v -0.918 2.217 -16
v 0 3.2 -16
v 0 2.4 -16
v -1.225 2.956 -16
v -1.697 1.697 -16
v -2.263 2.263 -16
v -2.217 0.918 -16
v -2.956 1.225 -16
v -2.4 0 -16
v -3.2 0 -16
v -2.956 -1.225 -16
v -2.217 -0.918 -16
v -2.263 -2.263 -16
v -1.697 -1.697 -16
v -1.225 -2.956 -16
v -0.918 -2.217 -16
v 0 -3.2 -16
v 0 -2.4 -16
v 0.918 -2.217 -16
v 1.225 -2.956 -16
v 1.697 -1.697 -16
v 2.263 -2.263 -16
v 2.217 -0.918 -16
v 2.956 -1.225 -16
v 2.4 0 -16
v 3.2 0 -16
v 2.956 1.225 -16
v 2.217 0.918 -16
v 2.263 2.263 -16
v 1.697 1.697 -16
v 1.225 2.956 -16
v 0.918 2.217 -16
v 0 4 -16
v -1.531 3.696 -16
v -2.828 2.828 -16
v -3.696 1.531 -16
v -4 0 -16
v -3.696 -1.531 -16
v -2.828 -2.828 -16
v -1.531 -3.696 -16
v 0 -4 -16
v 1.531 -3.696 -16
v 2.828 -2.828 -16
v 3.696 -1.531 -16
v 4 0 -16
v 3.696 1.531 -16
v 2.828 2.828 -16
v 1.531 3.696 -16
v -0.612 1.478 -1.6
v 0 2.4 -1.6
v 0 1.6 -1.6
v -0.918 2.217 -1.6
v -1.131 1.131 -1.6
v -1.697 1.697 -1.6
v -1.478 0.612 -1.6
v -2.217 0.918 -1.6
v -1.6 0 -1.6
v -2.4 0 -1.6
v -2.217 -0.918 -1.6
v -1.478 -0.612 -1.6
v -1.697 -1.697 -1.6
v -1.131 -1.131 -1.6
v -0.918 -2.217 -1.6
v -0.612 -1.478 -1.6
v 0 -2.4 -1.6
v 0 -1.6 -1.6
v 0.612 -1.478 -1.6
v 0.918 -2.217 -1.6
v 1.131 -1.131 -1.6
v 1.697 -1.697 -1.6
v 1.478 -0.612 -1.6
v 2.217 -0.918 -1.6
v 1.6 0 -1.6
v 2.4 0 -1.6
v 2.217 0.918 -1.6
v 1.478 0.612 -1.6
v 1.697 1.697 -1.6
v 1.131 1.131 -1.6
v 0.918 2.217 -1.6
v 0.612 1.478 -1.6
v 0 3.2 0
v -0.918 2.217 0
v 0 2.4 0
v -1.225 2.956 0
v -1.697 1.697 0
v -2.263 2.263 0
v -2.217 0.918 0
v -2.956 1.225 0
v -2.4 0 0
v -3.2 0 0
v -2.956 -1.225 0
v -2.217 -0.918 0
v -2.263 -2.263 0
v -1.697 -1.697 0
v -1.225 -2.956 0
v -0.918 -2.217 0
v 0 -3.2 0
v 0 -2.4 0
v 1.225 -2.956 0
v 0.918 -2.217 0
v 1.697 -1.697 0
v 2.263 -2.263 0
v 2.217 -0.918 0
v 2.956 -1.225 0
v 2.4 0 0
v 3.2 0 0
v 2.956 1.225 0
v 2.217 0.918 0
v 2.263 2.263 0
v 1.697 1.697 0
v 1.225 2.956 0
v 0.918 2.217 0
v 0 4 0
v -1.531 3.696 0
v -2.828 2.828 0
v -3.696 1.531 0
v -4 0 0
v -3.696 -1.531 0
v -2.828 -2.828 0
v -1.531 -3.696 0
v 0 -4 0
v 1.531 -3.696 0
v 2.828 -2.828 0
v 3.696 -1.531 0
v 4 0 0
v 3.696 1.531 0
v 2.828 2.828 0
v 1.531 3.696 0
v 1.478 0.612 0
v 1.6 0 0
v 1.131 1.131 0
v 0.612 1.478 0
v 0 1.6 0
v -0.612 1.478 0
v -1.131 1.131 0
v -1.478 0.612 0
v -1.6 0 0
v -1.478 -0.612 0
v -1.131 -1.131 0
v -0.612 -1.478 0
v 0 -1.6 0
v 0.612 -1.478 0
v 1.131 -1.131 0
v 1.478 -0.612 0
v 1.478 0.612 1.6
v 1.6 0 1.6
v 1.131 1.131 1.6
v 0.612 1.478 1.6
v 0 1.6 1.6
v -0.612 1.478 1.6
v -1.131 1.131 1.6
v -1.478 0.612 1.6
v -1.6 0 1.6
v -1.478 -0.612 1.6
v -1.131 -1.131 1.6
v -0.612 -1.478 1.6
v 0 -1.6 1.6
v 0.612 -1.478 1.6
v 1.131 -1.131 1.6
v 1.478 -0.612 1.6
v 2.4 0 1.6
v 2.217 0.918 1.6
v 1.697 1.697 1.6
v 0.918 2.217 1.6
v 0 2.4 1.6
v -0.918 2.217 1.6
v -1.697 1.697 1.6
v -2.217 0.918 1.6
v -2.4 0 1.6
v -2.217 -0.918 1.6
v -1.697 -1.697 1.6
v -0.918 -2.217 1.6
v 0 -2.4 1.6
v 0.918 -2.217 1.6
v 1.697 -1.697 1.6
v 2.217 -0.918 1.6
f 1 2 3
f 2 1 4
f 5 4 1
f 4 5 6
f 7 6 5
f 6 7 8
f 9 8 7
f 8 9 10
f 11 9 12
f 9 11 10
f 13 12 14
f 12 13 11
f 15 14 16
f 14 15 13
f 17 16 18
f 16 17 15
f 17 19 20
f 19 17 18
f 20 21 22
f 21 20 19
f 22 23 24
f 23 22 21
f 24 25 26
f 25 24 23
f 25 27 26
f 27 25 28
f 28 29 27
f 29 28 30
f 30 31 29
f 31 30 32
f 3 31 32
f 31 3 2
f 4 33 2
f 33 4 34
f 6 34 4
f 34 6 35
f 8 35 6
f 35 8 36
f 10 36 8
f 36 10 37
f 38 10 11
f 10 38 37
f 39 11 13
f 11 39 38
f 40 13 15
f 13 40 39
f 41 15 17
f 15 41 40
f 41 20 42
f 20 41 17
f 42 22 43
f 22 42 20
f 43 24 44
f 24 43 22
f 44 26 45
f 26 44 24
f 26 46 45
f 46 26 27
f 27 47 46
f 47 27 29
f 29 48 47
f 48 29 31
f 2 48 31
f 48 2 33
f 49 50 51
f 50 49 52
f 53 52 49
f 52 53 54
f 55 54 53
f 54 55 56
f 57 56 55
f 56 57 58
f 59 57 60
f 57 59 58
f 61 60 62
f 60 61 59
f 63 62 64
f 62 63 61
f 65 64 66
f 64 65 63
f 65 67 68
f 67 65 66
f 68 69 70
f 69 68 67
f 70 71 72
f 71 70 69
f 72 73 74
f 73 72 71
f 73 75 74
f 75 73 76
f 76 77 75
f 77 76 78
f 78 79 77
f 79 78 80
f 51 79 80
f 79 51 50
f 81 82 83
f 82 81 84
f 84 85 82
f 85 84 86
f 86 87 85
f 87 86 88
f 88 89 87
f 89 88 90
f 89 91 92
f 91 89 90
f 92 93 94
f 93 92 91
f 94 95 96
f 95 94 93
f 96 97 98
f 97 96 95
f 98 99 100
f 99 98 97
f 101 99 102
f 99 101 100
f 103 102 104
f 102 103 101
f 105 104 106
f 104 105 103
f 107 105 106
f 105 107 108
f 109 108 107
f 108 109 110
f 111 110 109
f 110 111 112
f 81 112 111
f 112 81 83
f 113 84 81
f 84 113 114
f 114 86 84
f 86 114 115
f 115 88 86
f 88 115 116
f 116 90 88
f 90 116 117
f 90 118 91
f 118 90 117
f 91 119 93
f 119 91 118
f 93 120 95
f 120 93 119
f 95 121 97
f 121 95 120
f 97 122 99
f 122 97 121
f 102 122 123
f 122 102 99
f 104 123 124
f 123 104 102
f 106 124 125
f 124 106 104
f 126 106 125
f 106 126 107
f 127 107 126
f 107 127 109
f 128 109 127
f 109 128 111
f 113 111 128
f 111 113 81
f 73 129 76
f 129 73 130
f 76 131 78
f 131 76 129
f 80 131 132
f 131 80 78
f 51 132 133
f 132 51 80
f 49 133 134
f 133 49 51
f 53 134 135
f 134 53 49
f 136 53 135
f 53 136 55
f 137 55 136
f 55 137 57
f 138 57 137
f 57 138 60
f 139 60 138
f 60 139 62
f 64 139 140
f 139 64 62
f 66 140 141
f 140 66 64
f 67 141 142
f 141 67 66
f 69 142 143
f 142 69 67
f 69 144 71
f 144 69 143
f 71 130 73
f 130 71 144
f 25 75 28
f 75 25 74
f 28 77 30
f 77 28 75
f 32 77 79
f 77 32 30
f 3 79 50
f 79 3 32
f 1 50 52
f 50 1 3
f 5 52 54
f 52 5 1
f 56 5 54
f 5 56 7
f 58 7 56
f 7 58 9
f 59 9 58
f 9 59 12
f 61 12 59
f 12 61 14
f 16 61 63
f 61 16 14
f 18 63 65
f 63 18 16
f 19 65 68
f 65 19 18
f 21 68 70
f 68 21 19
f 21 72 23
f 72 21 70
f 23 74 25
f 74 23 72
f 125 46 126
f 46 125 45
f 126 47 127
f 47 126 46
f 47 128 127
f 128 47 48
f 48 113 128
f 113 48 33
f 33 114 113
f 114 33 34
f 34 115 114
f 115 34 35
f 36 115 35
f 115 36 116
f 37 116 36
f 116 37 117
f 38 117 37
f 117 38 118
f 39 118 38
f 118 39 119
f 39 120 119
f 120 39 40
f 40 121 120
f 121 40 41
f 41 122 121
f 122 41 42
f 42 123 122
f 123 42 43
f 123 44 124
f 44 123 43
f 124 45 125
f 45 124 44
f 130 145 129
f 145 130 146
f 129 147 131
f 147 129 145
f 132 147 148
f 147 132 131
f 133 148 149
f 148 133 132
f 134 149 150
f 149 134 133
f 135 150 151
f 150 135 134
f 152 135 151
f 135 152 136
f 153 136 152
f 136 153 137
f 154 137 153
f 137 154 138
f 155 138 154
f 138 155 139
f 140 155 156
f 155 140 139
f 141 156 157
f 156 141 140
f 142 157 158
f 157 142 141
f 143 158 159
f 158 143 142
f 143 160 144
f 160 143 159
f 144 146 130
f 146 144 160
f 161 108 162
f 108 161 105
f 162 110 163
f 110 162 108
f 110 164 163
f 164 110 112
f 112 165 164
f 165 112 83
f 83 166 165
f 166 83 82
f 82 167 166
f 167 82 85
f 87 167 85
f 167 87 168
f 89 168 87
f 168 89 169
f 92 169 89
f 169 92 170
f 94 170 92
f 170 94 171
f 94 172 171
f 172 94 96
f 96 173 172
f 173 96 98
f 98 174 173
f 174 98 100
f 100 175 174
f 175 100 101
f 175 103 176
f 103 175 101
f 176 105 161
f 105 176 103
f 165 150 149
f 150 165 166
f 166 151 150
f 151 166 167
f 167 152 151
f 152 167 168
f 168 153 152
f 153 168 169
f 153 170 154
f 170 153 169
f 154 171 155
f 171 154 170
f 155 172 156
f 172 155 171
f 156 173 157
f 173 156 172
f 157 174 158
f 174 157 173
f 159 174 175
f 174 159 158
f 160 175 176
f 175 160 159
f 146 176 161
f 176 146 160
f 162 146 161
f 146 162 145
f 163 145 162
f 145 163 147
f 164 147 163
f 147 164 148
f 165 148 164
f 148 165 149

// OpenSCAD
// file: ../p/stud2a.scad
use <../lib.scad>
use <4-4cyli.scad>
use <4-4edge.scad>
use <4-4ring2.scad>
function ldraw_lib__stud2a() = [
// 0 Stud Open without Base Edges
// 0 Name: stud2a.dat
// 0 Author: James Jessiman
// 0 !LDRAW_ORG Primitive UPDATE 2009-02
// 0 !LICENSE Licensed under CC BY 2.0 and CC BY 4.0 : see CAreadme.txt
// 
// 0 BFC CERTIFY CCW
  [0,"BFC","CERTIFY"],
  [0,"BFC","CCW"],
// 
// 0 !HISTORY 1999-07-05 [PTadmin] Official Update 1999-05
// 0 !HISTORY 2002-04-04 [sbliss] Modified for BFC compliance
// 0 !HISTORY 2002-04-25 [PTadmin] Official Update 2002-02
// 0 !HISTORY 2007-06-24 [PTadmin] Header formatted for Contributor Agreement
// 0 !HISTORY 2008-07-01 [PTadmin] Official Update 2008-01
// 0 !HISTORY 2009-06-21 [cwdee] Update ring references to 4-4ring
// 0 !HISTORY 2009-09-03 [PTadmin] Official Update 2009-02
// 
// 
// 1 16 0 -4 0 4 0 0 0 1 0 0 0 4 4-4edge.dat
  [1,16,0,-4,0,4,0,0,0,1,0,0,0,4, ldraw_lib__4_4edge()],
// 1 16 0 -4 0 6 0 0 0 1 0 0 0 6 4-4edge.dat
  [1,16,0,-4,0,6,0,0,0,1,0,0,0,6, ldraw_lib__4_4edge()],
// 0 BFC INVERTNEXT
  [0,"BFC","INVERTNEXT"],
// 1 16 0 -4 0 4 0 0 0 4 0 0 0 4 4-4cyli.dat
  [1,16,0,-4,0,4,0,0,0,4,0,0,0,4, ldraw_lib__4_4cyli()],
// 1 16 0 -4 0 6 0 0 0 4 0 0 0 6 4-4cyli.dat
  [1,16,0,-4,0,6,0,0,0,4,0,0,0,6, ldraw_lib__4_4cyli()],
// 1 16 0 -4 0 2 0 0 0 1 0 0 0 2 4-4ring2.dat
  [1,16,0,-4,0,2,0,0,0,1,0,0,0,2, ldraw_lib__4_4ring2()],
// 0
];
module ldraw_lib__stud2a(step=0, col=false, unit=2/5, alt=false, line=0.2, solid=!$preview)
    makepoly(ldraw_lib__stud2a(), step=step, col=col, unit=unit, alt=alt, line=line, solid=solid);
ldraw_lib__stud2a(line=0.2);
// file: ../p/4-4ring4.scad
use <../lib.scad>
function ldraw_lib__4_4ring4() = [
// 0 Ring  4 x 1.0
// 0 Name: 4-4ring4.dat
// 0 Author: James Jessiman
// 0 !LDRAW_ORG Primitive UPDATE 2009-01
// 0 !LICENSE Licensed under CC BY 2.0 and CC BY 4.0 : see CAreadme.txt
// 
// 0 BFC CERTIFY CCW
  [0,"BFC","CERTIFY"],
  [0,"BFC","CCW"],
// 
// 0 !HISTORY 1998-12-15 [PTadmin] Official Update 1998-10
// 0 !HISTORY 2002-04-08 [BrickCaster] Modified for BFC compliance
// 0 !HISTORY 2002-04-25 [PTadmin] Official Update 2002-02
// 0 !HISTORY 2007-06-24 [PTadmin] Header formatted for Contributor Agreement
// 0 !HISTORY 2008-07-01 [PTadmin] Official Update 2008-01
// 0 !HISTORY 2008-08-26 [cwdee] Switch polygon winding and rename
// 0 !HISTORY 2009-05-02 [PTadmin] Official Update 2009-01
// 
// 
// 4 16 -1.9135 0 4.6195 -1.5308 0 3.6956 0 0 4 0 0 5
  [4,16,-1.9135,0,4.6195,-1.5308,0,3.6956,0,0,4,0,0,5],
// 4 16 -3.5355 0 3.5355 -2.8284 0 2.8284 -1.5308 0 3.6956 -1.9135 0 4.6195
  [4,16,-3.5355,0,3.5355,-2.8284,0,2.8284,-1.5308,0,3.6956,-1.9135,0,4.6195],
// 4 16 -4.6195 0 1.9135 -3.6956 0 1.5308 -2.8284 0 2.8284 -3.5355 0 3.5355
  [4,16,-4.6195,0,1.9135,-3.6956,0,1.5308,-2.8284,0,2.8284,-3.5355,0,3.5355],
// 4 16 -5 0 0 -4 0 0 -3.6956 0 1.5308 -4.6195 0 1.9135
  [4,16,-5,0,0,-4,0,0,-3.6956,0,1.5308,-4.6195,0,1.9135],
// 4 16 -4.6195 0 -1.9135 -3.6956 0 -1.5308 -4 0 0 -5 0 0
  [4,16,-4.6195,0,-1.9135,-3.6956,0,-1.5308,-4,0,0,-5,0,0],
// 4 16 -3.5355 0 -3.5355 -2.8284 0 -2.8284 -3.6956 0 -1.5308 -4.6195 0 -1.9135
  [4,16,-3.5355,0,-3.5355,-2.8284,0,-2.8284,-3.6956,0,-1.5308,-4.6195,0,-1.9135],
// 4 16 -1.9135 0 -4.6195 -1.5308 0 -3.6956 -2.8284 0 -2.8284 -3.5355 0 -3.5355
  [4,16,-1.9135,0,-4.6195,-1.5308,0,-3.6956,-2.8284,0,-2.8284,-3.5355,0,-3.5355],
// 4 16 0 0 -5 0 0 -4 -1.5308 0 -3.6956 -1.9135 0 -4.6195
  [4,16,0,0,-5,0,0,-4,-1.5308,0,-3.6956,-1.9135,0,-4.6195],
// 4 16 1.9135 0 -4.6195 1.5308 0 -3.6956 0 0 -4 0 0 -5
  [4,16,1.9135,0,-4.6195,1.5308,0,-3.6956,0,0,-4,0,0,-5],
// 4 16 3.5355 0 -3.5355 2.8284 0 -2.8284 1.5308 0 -3.6956 1.9135 0 -4.6195
  [4,16,3.5355,0,-3.5355,2.8284,0,-2.8284,1.5308,0,-3.6956,1.9135,0,-4.6195],
// 4 16 4.6195 0 -1.9135 3.6956 0 -1.5308 2.8284 0 -2.8284 3.5355 0 -3.5355
  [4,16,4.6195,0,-1.9135,3.6956,0,-1.5308,2.8284,0,-2.8284,3.5355,0,-3.5355],
// 4 16 5 0 0 4 0 0 3.6956 0 -1.5308 4.6195 0 -1.9135
  [4,16,5,0,0,4,0,0,3.6956,0,-1.5308,4.6195,0,-1.9135],
// 4 16 4.6195 0 1.9135 3.6956 0 1.5308 4 0 0 5 0 0
  [4,16,4.6195,0,1.9135,3.6956,0,1.5308,4,0,0,5,0,0],
// 4 16 3.5355 0 3.5355 2.8284 0 2.8284 3.6956 0 1.5308 4.6195 0 1.9135
  [4,16,3.5355,0,3.5355,2.8284,0,2.8284,3.6956,0,1.5308,4.6195,0,1.9135],
// 4 16 1.9135 0 4.6195 1.5308 0 3.6956 2.8284 0 2.8284 3.5355 0 3.5355
  [4,16,1.9135,0,4.6195,1.5308,0,3.6956,2.8284,0,2.8284,3.5355,0,3.5355],
// 4 16 0 0 5 0 0 4 1.5308 0 3.6956 1.9135 0 4.6195
  [4,16,0,0,5,0,0,4,1.5308,0,3.6956,1.9135,0,4.6195],
// 0
];
module ldraw_lib__4_4ring4(step=0, col=false, unit=2/5, alt=false, line=0.2, solid=!$preview)
    makepoly(ldraw_lib__4_4ring4(), step=step, col=col, unit=unit, alt=alt, line=line, solid=solid);
ldraw_lib__4_4ring4(line=0.2);
// file: ../p/4-4ring3.scad
use <../lib.scad>
function ldraw_lib__4_4ring3() = [
// 0 Ring  3 x 1.0
// 0 Name: 4-4ring3.dat
// 0 Author: James Jessiman
// 0 !LDRAW_ORG Primitive UPDATE 2009-01
// 0 !LICENSE Licensed under CC BY 2.0 and CC BY 4.0 : see CAreadme.txt
// 
// 0 BFC CERTIFY CCW
  [0,"BFC","CERTIFY"],
  [0,"BFC","CCW"],
// 
// 0 !HISTORY 1998-12-15 [PTadmin] Official Update 1998-10
// 0 !HISTORY 2002-04-05 [hafhead] Added BFC statement
// 0 !HISTORY 2002-04-25 [PTadmin] Official Update 2002-02
// 0 !HISTORY 2007-06-24 [PTadmin] Header formatted for Contributor Agreement
// 0 !HISTORY 2008-07-01 [PTadmin] Official Update 2008-01
// 0 !HISTORY 2008-08-26 [cwdee] Switch polygon winding and rename
// 0 !HISTORY 2009-05-02 [PTadmin] Official Update 2009-01
// 
// 
// 4 16 -1.5308 0 3.6956 -1.1481 0 2.7717 0 0 3 0 0 4
  [4,16,-1.5308,0,3.6956,-1.1481,0,2.7717,0,0,3,0,0,4],
// 4 16 -2.8284 0 2.8284 -2.1213 0 2.1213 -1.1481 0 2.7717 -1.5308 0 3.6956
  [4,16,-2.8284,0,2.8284,-2.1213,0,2.1213,-1.1481,0,2.7717,-1.5308,0,3.6956],
// 4 16 -3.6956 0 1.5308 -2.7717 0 1.1481 -2.1213 0 2.1213 -2.8284 0 2.8284
  [4,16,-3.6956,0,1.5308,-2.7717,0,1.1481,-2.1213,0,2.1213,-2.8284,0,2.8284],
// 4 16 -4 0 0 -3 0 0 -2.7717 0 1.1481 -3.6956 0 1.5308
  [4,16,-4,0,0,-3,0,0,-2.7717,0,1.1481,-3.6956,0,1.5308],
// 4 16 -3.6956 0 -1.5308 -2.7717 0 -1.1481 -3 0 0 -4 0 0
  [4,16,-3.6956,0,-1.5308,-2.7717,0,-1.1481,-3,0,0,-4,0,0],
// 4 16 -2.8284 0 -2.8284 -2.1213 0 -2.1213 -2.7717 0 -1.1481 -3.6956 0 -1.5308
  [4,16,-2.8284,0,-2.8284,-2.1213,0,-2.1213,-2.7717,0,-1.1481,-3.6956,0,-1.5308],
// 4 16 -1.5308 0 -3.6956 -1.1481 0 -2.7717 -2.1213 0 -2.1213 -2.8284 0 -2.8284
  [4,16,-1.5308,0,-3.6956,-1.1481,0,-2.7717,-2.1213,0,-2.1213,-2.8284,0,-2.8284],
// 4 16 0 0 -4 0 0 -3 -1.1481 0 -2.7717 -1.5308 0 -3.6956
  [4,16,0,0,-4,0,0,-3,-1.1481,0,-2.7717,-1.5308,0,-3.6956],
// 4 16 1.5308 0 -3.6956 1.1481 0 -2.7717 0 0 -3 0 0 -4
  [4,16,1.5308,0,-3.6956,1.1481,0,-2.7717,0,0,-3,0,0,-4],
// 4 16 2.8284 0 -2.8284 2.1213 0 -2.1213 1.1481 0 -2.7717 1.5308 0 -3.6956
  [4,16,2.8284,0,-2.8284,2.1213,0,-2.1213,1.1481,0,-2.7717,1.5308,0,-3.6956],
// 4 16 3.6956 0 -1.5308 2.7717 0 -1.1481 2.1213 0 -2.1213 2.8284 0 -2.8284
  [4,16,3.6956,0,-1.5308,2.7717,0,-1.1481,2.1213,0,-2.1213,2.8284,0,-2.8284],
// 4 16 4 0 0 3 0 0 2.7717 0 -1.1481 3.6956 0 -1.5308
  [4,16,4,0,0,3,0,0,2.7717,0,-1.1481,3.6956,0,-1.5308],
// 4 16 3.6956 0 1.5308 2.7717 0 1.1481 3 0 0 4 0 0
  [4,16,3.6956,0,1.5308,2.7717,0,1.1481,3,0,0,4,0,0],
// 4 16 2.8284 0 2.8284 2.1213 0 2.1213 2.7717 0 1.1481 3.6956 0 1.5308
  [4,16,2.8284,0,2.8284,2.1213,0,2.1213,2.7717,0,1.1481,3.6956,0,1.5308],
// 4 16 1.5308 0 3.6956 1.1481 0 2.7717 2.1213 0 2.1213 2.8284 0 2.8284
  [4,16,1.5308,0,3.6956,1.1481,0,2.7717,2.1213,0,2.1213,2.8284,0,2.8284],
// 4 16 0 0 4 0 0 3 1.1481 0 2.7717 1.5308 0 3.6956
  [4,16,0,0,4,0,0,3,1.1481,0,2.7717,1.5308,0,3.6956],
// 0
];
module ldraw_lib__4_4ring3(step=0, col=false, unit=2/5, alt=false, line=0.2, solid=!$preview)
    makepoly(ldraw_lib__4_4ring3(), step=step, col=col, unit=unit, alt=alt, line=line, solid=solid);
ldraw_lib__4_4ring3(line=0.2);
// file: ../p/4-4ring2.scad
use <../lib.scad>
function ldraw_lib__4_4ring2() = [
// 0 Ring  2 x 1.0
// 0 Name: 4-4ring2.dat
// 0 Author: James Jessiman
// 0 !LDRAW_ORG Primitive UPDATE 2009-01
// 0 !LICENSE Licensed under CC BY 2.0 and CC BY 4.0 : see CAreadme.txt
// 
// 0 BFC CERTIFY CCW
  [0,"BFC","CERTIFY"],
  [0,"BFC","CCW"],
// 
// 0 !HISTORY 1998-12-15 [PTadmin] Official Update 1998-10
// 0 !HISTORY 2002-04-05 [hafhead] Added BFC statement
// 0 !HISTORY 2002-04-25 [PTadmin] Official Update 2002-02
// 0 !HISTORY 2007-06-24 [PTadmin] Header formatted for Contributor Agreement
// 0 !HISTORY 2008-07-01 [PTadmin] Official Update 2008-01
// 0 !HISTORY 2008-08-26 [cwdee] Switch polygon winding and rename
// 0 !HISTORY 2009-05-02 [PTadmin] Official Update 2009-01
// 
// 
// 4 16 -1.1481 0 2.7717 -0.7654 0 1.8478 0 0 2 0 0 3
  [4,16,-1.1481,0,2.7717,-0.7654,0,1.8478,0,0,2,0,0,3],
// 4 16 -2.1213 0 2.1213 -1.4142 0 1.4142 -0.7654 0 1.8478 -1.1481 0 2.7717
  [4,16,-2.1213,0,2.1213,-1.4142,0,1.4142,-0.7654,0,1.8478,-1.1481,0,2.7717],
// 4 16 -2.7717 0 1.1481 -1.8478 0 0.7654 -1.4142 0 1.4142 -2.1213 0 2.1213
  [4,16,-2.7717,0,1.1481,-1.8478,0,0.7654,-1.4142,0,1.4142,-2.1213,0,2.1213],
// 4 16 -3 0 0 -2 0 0 -1.8478 0 0.7654 -2.7717 0 1.1481
  [4,16,-3,0,0,-2,0,0,-1.8478,0,0.7654,-2.7717,0,1.1481],
// 4 16 -2.7717 0 -1.1481 -1.8478 0 -0.7654 -2 0 0 -3 0 0
  [4,16,-2.7717,0,-1.1481,-1.8478,0,-0.7654,-2,0,0,-3,0,0],
// 4 16 -2.1213 0 -2.1213 -1.4142 0 -1.4142 -1.8478 0 -0.7654 -2.7717 0 -1.1481
  [4,16,-2.1213,0,-2.1213,-1.4142,0,-1.4142,-1.8478,0,-0.7654,-2.7717,0,-1.1481],
// 4 16 -1.1481 0 -2.7717 -0.7654 0 -1.8478 -1.4142 0 -1.4142 -2.1213 0 -2.1213
  [4,16,-1.1481,0,-2.7717,-0.7654,0,-1.8478,-1.4142,0,-1.4142,-2.1213,0,-2.1213],
// 4 16 0 0 -3 0 0 -2 -0.7654 0 -1.8478 -1.1481 0 -2.7717
  [4,16,0,0,-3,0,0,-2,-0.7654,0,-1.8478,-1.1481,0,-2.7717],
// 4 16 1.1481 0 -2.7717 0.7654 0 -1.8478 0 0 -2 0 0 -3
  [4,16,1.1481,0,-2.7717,0.7654,0,-1.8478,0,0,-2,0,0,-3],
// 4 16 2.1213 0 -2.1213 1.4142 0 -1.4142 0.7654 0 -1.8478 1.1481 0 -2.7717
  [4,16,2.1213,0,-2.1213,1.4142,0,-1.4142,0.7654,0,-1.8478,1.1481,0,-2.7717],
// 4 16 2.7717 0 -1.1481 1.8478 0 -0.7654 1.4142 0 -1.4142 2.1213 0 -2.1213
  [4,16,2.7717,0,-1.1481,1.8478,0,-0.7654,1.4142,0,-1.4142,2.1213,0,-2.1213],
// 4 16 3 0 0 2 0 0 1.8478 0 -0.7654 2.7717 0 -1.1481
  [4,16,3,0,0,2,0,0,1.8478,0,-0.7654,2.7717,0,-1.1481],
// 4 16 2.7717 0 1.1481 1.8478 0 0.7654 2 0 0 3 0 0
  [4,16,2.7717,0,1.1481,1.8478,0,0.7654,2,0,0,3,0,0],
// 4 16 2.1213 0 2.1213 1.4142 0 1.4142 1.8478 0 0.7654 2.7717 0 1.1481
  [4,16,2.1213,0,2.1213,1.4142,0,1.4142,1.8478,0,0.7654,2.7717,0,1.1481],
// 4 16 1.1481 0 2.7717 0.7654 0 1.8478 1.4142 0 1.4142 2.1213 0 2.1213
  [4,16,1.1481,0,2.7717,0.7654,0,1.8478,1.4142,0,1.4142,2.1213,0,2.1213],
// 4 16 0 0 3 0 0 2 0.7654 0 1.8478 1.1481 0 2.7717
  [4,16,0,0,3,0,0,2,0.7654,0,1.8478,1.1481,0,2.7717],
// 0
];
module ldraw_lib__4_4ring2(step=0, col=false, unit=2/5, alt=false, line=0.2, solid=!$preview)
    makepoly(ldraw_lib__4_4ring2(), step=step, col=col, unit=unit, alt=alt, line=line, solid=solid);
ldraw_lib__4_4ring2(line=0.2);
// file: ../p/4-4edge.scad
use <../lib.scad>
function ldraw_lib__4_4edge() = [
// 0 Circle 1.0
// 0 Name: 4-4edge.dat
// 0 Author: James Jessiman
// 0 !LDRAW_ORG Primitive UPDATE 2017-01
// 0 !LICENSE Licensed under CC BY 2.0 and CC BY 4.0 : see CAreadme.txt
// 
// 0 BFC CERTIFY CCW
  [0,"BFC","CERTIFY"],
  [0,"BFC","CCW"],
// 
// 0 !HISTORY 1998-12-15 [PTadmin] Official Update 1998-10
// 0 !HISTORY 2005-12-28 [PTadmin] Official Update 2005-01
// 0 !HISTORY 2007-06-24 [PTadmin] Header formatted for Contributor Agreement
// 0 !HISTORY 2008-07-01 [PTadmin] Official Update 2008-01
// 0 !HISTORY 2017-01-15 [Steffen] BFCed
// 0 !HISTORY 2017-12-30 [PTadmin] Official Update 2017-01
// 
// 
// 2 24 1 0 0 0.9239 0 0.3827
  [2,24,1,0,0,0.9239,0,0.3827],
// 2 24 0.9239 0 0.3827 0.7071 0 0.7071
  [2,24,0.9239,0,0.3827,0.7071,0,0.7071],
// 2 24 0.7071 0 0.7071 0.3827 0 0.9239
  [2,24,0.7071,0,0.7071,0.3827,0,0.9239],
// 2 24 0.3827 0 0.9239 0 0 1
  [2,24,0.3827,0,0.9239,0,0,1],
// 2 24 0 0 1 -0.3827 0 0.9239
  [2,24,0,0,1,-0.3827,0,0.9239],
// 2 24 -0.3827 0 0.9239 -0.7071 0 0.7071
  [2,24,-0.3827,0,0.9239,-0.7071,0,0.7071],
// 2 24 -0.7071 0 0.7071 -0.9239 0 0.3827
  [2,24,-0.7071,0,0.7071,-0.9239,0,0.3827],
// 2 24 -0.9239 0 0.3827 -1 0 -0
  [2,24,-0.9239,0,0.3827,-1,0,-0],
// 2 24 -1 0 -0 -0.9239 0 -0.3827
  [2,24,-1,0,-0,-0.9239,0,-0.3827],
// 2 24 -0.9239 0 -0.3827 -0.7071 0 -0.7071
  [2,24,-0.9239,0,-0.3827,-0.7071,0,-0.7071],
// 2 24 -0.7071 0 -0.7071 -0.3827 0 -0.9239
  [2,24,-0.7071,0,-0.7071,-0.3827,0,-0.9239],
// 2 24 -0.3827 0 -0.9239 0 0 -1
  [2,24,-0.3827,0,-0.9239,0,0,-1],
// 2 24 0 0 -1 0.3827 0 -0.9239
  [2,24,0,0,-1,0.3827,0,-0.9239],
// 2 24 0.3827 0 -0.9239 0.7071 0 -0.7071
  [2,24,0.3827,0,-0.9239,0.7071,0,-0.7071],
// 2 24 0.7071 0 -0.7071 0.9239 0 -0.3827
  [2,24,0.7071,0,-0.7071,0.9239,0,-0.3827],
// 2 24 0.9239 0 -0.3827 1 0 0
  [2,24,0.9239,0,-0.3827,1,0,0],
];
module ldraw_lib__4_4edge(step=0, col=false, unit=2/5, alt=false, line=0.2, solid=!$preview)
    makepoly(ldraw_lib__4_4edge(), step=step, col=col, unit=unit, alt=alt, line=line, solid=solid);
ldraw_lib__4_4edge(line=0.2);
// file: ../p/4-4cyli.scad
use <../lib.scad>
function ldraw_lib__4_4cyli() = [
// 0 Cylinder 1.0
// 0 Name: 4-4cyli.dat
// 0 Author: James Jessiman
// 0 !LDRAW_ORG Primitive UPDATE 2005-01
// 0 !LICENSE Licensed under CC BY 2.0 and CC BY 4.0 : see CAreadme.txt
// 
// 0 BFC CERTIFY CCW
  [0,"BFC","CERTIFY"],
  [0,"BFC","CCW"],
// 
// 0 !HISTORY 1998-12-15 [PTadmin] Official Update 1998-10
// 0 !HISTORY 2002-03-23 [sbliss] Added BFC statement; merged headers from files in distributions LDraw 0.27 and Complete.
// 0 !HISTORY 2002-04-25 [PTadmin] Official Update 2002-02
// 0 !HISTORY 2004-12-14 [guyvivan] BFC CCW
// 0 !HISTORY 2005-12-28 [PTadmin] Official Update 2005-01
// 0 !HISTORY 2007-06-24 [PTadmin] Header formatted for Contributor Agreement
// 0 !HISTORY 2008-07-01 [PTadmin] Official Update 2008-01
// 
// 
// 4 16 1 1 0 0.9239 1 0.3827 0.9239 0 0.3827 1 0 0
  [4,16,1,1,0,0.9239,1,0.3827,0.9239,0,0.3827,1,0,0],
// 5 24 1 0 0 1 1 0 0.9239 0 0.3827 0.9239 0 -0.3827
  [5,24,1,0,0,1,1,0,0.9239,0,0.3827,0.9239,0,-0.3827],
// 4 16 0.9239 1 0.3827 0.7071 1 0.7071 0.7071 0 0.7071 0.9239 0 0.3827
  [4,16,0.9239,1,0.3827,0.7071,1,0.7071,0.7071,0,0.7071,0.9239,0,0.3827],
// 5 24 0.9239 0 0.3827 0.9239 1 0.3827 0.7071 0 0.7071 1 0 0
  [5,24,0.9239,0,0.3827,0.9239,1,0.3827,0.7071,0,0.7071,1,0,0],
// 4 16 0.7071 1 0.7071 0.3827 1 0.9239 0.3827 0 0.9239 0.7071 0 0.7071
  [4,16,0.7071,1,0.7071,0.3827,1,0.9239,0.3827,0,0.9239,0.7071,0,0.7071],
// 5 24 0.7071 0 0.7071 0.7071 1 0.7071 0.3827 0 0.9239 0.9239 0 0.3827
  [5,24,0.7071,0,0.7071,0.7071,1,0.7071,0.3827,0,0.9239,0.9239,0,0.3827],
// 4 16 0.3827 1 0.9239 0 1 1 0 0 1 0.3827 0 0.9239
  [4,16,0.3827,1,0.9239,0,1,1,0,0,1,0.3827,0,0.9239],
// 5 24 0.3827 0 0.9239 0.3827 1 0.9239 0 0 1 0.7071 0 0.7071
  [5,24,0.3827,0,0.9239,0.3827,1,0.9239,0,0,1,0.7071,0,0.7071],
// 4 16 0 1 1 -0.3827 1 0.9239 -0.3827 0 0.9239 0 0 1
  [4,16,0,1,1,-0.3827,1,0.9239,-0.3827,0,0.9239,0,0,1],
// 5 24 0 0 1 0 1 1 -0.3827 0 0.9239 0.3827 0 0.9239
  [5,24,0,0,1,0,1,1,-0.3827,0,0.9239,0.3827,0,0.9239],
// 4 16 -0.3827 1 0.9239 -0.7071 1 0.7071 -0.7071 0 0.7071 -0.3827 0 0.9239
  [4,16,-0.3827,1,0.9239,-0.7071,1,0.7071,-0.7071,0,0.7071,-0.3827,0,0.9239],
// 5 24 -0.3827 0 0.9239 -0.3827 1 0.9239 -0.7071 0 0.7071 0 0 1
  [5,24,-0.3827,0,0.9239,-0.3827,1,0.9239,-0.7071,0,0.7071,0,0,1],
// 4 16 -0.7071 1 0.7071 -0.9239 1 0.3827 -0.9239 0 0.3827 -0.7071 0 0.7071
  [4,16,-0.7071,1,0.7071,-0.9239,1,0.3827,-0.9239,0,0.3827,-0.7071,0,0.7071],
// 5 24 -0.7071 0 0.7071 -0.7071 1 0.7071 -0.9239 0 0.3827 -0.3827 0 0.9239
  [5,24,-0.7071,0,0.7071,-0.7071,1,0.7071,-0.9239,0,0.3827,-0.3827,0,0.9239],
// 4 16 -0.9239 1 0.3827 -1 1 0 -1 0 0 -0.9239 0 0.3827
  [4,16,-0.9239,1,0.3827,-1,1,0,-1,0,0,-0.9239,0,0.3827],
// 5 24 -0.9239 0 0.3827 -0.9239 1 0.3827 -1 0 0 -0.7071 0 0.7071
  [5,24,-0.9239,0,0.3827,-0.9239,1,0.3827,-1,0,0,-0.7071,0,0.7071],
// 4 16 -1 1 0 -0.9239 1 -0.3827 -0.9239 0 -0.3827 -1 0 0
  [4,16,-1,1,0,-0.9239,1,-0.3827,-0.9239,0,-0.3827,-1,0,0],
// 5 24 -1 0 0 -1 1 0 -0.9239 0 -0.3827 -0.9239 0 0.3827
  [5,24,-1,0,0,-1,1,0,-0.9239,0,-0.3827,-0.9239,0,0.3827],
// 4 16 -0.9239 1 -0.3827 -0.7071 1 -0.7071 -0.7071 0 -0.7071 -0.9239 0 -0.3827
  [4,16,-0.9239,1,-0.3827,-0.7071,1,-0.7071,-0.7071,0,-0.7071,-0.9239,0,-0.3827],
// 5 24 -0.9239 0 -0.3827 -0.9239 1 -0.3827 -0.7071 0 -0.7071 -1 0 0
  [5,24,-0.9239,0,-0.3827,-0.9239,1,-0.3827,-0.7071,0,-0.7071,-1,0,0],
// 4 16 -0.7071 1 -0.7071 -0.3827 1 -0.9239 -0.3827 0 -0.9239 -0.7071 0 -0.7071
  [4,16,-0.7071,1,-0.7071,-0.3827,1,-0.9239,-0.3827,0,-0.9239,-0.7071,0,-0.7071],
// 5 24 -0.7071 0 -0.7071 -0.7071 1 -0.7071 -0.3827 0 -0.9239 -0.9239 0 -0.3827
  [5,24,-0.7071,0,-0.7071,-0.7071,1,-0.7071,-0.3827,0,-0.9239,-0.9239,0,-0.3827],
// 4 16 -0.3827 1 -0.9239 0 1 -1 0 0 -1 -0.3827 0 -0.9239
  [4,16,-0.3827,1,-0.9239,0,1,-1,0,0,-1,-0.3827,0,-0.9239],
// 5 24 -0.3827 0 -0.9239 -0.3827 1 -0.9239 0 0 -1 -0.7071 0 -0.7071
  [5,24,-0.3827,0,-0.9239,-0.3827,1,-0.9239,0,0,-1,-0.7071,0,-0.7071],
// 4 16 0 1 -1 0.3827 1 -0.9239 0.3827 0 -0.9239 0 0 -1
  [4,16,0,1,-1,0.3827,1,-0.9239,0.3827,0,-0.9239,0,0,-1],
// 5 24 0 0 -1 0 1 -1 0.3827 0 -0.9239 -0.3827 0 -0.9239
  [5,24,0,0,-1,0,1,-1,0.3827,0,-0.9239,-0.3827,0,-0.9239],
// 4 16 0.3827 1 -0.9239 0.7071 1 -0.7071 0.7071 0 -0.7071 0.3827 0 -0.9239
  [4,16,0.3827,1,-0.9239,0.7071,1,-0.7071,0.7071,0,-0.7071,0.3827,0,-0.9239],
// 5 24 0.3827 0 -0.9239 0.3827 1 -0.9239 0.7071 0 -0.7071 0 0 -1
  [5,24,0.3827,0,-0.9239,0.3827,1,-0.9239,0.7071,0,-0.7071,0,0,-1],
// 4 16 0.7071 1 -0.7071 0.9239 1 -0.3827 0.9239 0 -0.3827 0.7071 0 -0.7071
  [4,16,0.7071,1,-0.7071,0.9239,1,-0.3827,0.9239,0,-0.3827,0.7071,0,-0.7071],
// 5 24 0.7071 0 -0.7071 0.7071 1 -0.7071 0.9239 0 -0.3827 0.3827 0 -0.9239
  [5,24,0.7071,0,-0.7071,0.7071,1,-0.7071,0.9239,0,-0.3827,0.3827,0,-0.9239],
// 4 16 0.9239 1 -0.3827 1 1 0 1 0 0 0.9239 0 -0.3827
  [4,16,0.9239,1,-0.3827,1,1,0,1,0,0,0.9239,0,-0.3827],
// 5 24 0.9239 0 -0.3827 0.9239 1 -0.3827 1 0 0 0.7071 0 -0.7071
  [5,24,0.9239,0,-0.3827,0.9239,1,-0.3827,1,0,0,0.7071,0,-0.7071],
// 0
];
module ldraw_lib__4_4cyli(step=0, col=false, unit=2/5, alt=false, line=0.2, solid=!$preview)
    makepoly(ldraw_lib__4_4cyli(), step=step, col=col, unit=unit, alt=alt, line=line, solid=solid);
ldraw_lib__4_4cyli(line=0.2);
// file: 71075a.scad
use <../lib.scad>
use <../p/4-4cyli.scad>
use <../p/4-4edge.scad>
use <../p/4-4ring2.scad>
use <../p/4-4ring3.scad>
use <../p/4-4ring4.scad>
use <../p/stud2a.scad>
function ldraw_lib__71075a() = [
// 0 Brick  1 x  1 x  1.667 Round
// 0 Name: 71075a.dat
// 0 Author: James Jessiman
// 0 !LDRAW_ORG Part UPDATE 2010-01
// 0 !LICENSE Licensed under CC BY 2.0 and CC BY 4.0 : see CAreadme.txt
// 
// 0 BFC CERTIFY CCW
  [0,"BFC","CERTIFY"],
  [0,"BFC","CCW"],
// 
// 0 !HISTORY 1998-06-20 [PTadmin] Official Update 1998-06
// 0 !HISTORY 2007-10-12 [PTadmin] Header formatted for Contributor Agreement
// 0 !HISTORY 2008-07-01 [PTadmin] Official Update 2008-01
// 0 !HISTORY 2008-07-07 [jriley] Made BFC compliant
// 0 !HISTORY 2008-07-07 [guyvivan] Fixed header and author
// 0 !HISTORY 2009-05-21 [PTadmin] Renamed from 71076. Part number really is 71075, but was mistakenly issued as 71076
// 0 !HISTORY 2010-04-05 [PTadmin] Official Update 2010-01
// 
// 
// 1 16 0 40 0 6 0 0 0 1 0 0 0 6 4-4edge.dat
  [1,16,0,40,0,6,0,0,0,1,0,0,0,6, ldraw_lib__4_4edge()],
// 1 16 0 40 0 10 0 0 0 1 0 0 0 10 4-4edge.dat
  [1,16,0,40,0,10,0,0,0,1,0,0,0,10, ldraw_lib__4_4edge()],
// 1 16 0 4 0 4 0 0 0 1 0 0 0 4 4-4edge.dat
  [1,16,0,4,0,4,0,0,0,1,0,0,0,4, ldraw_lib__4_4edge()],
// 1 16 0 4 0 6 0 0 0 1 0 0 0 6 4-4edge.dat
  [1,16,0,4,0,6,0,0,0,1,0,0,0,6, ldraw_lib__4_4edge()],
// 1 16 0 0 0 6 0 0 0 1 0 0 0 6 4-4edge.dat
  [1,16,0,0,0,6,0,0,0,1,0,0,0,6, ldraw_lib__4_4edge()],
// 1 16 0 0 0 10 0 0 0 1 0 0 0 10 4-4edge.dat
  [1,16,0,0,0,10,0,0,0,1,0,0,0,10, ldraw_lib__4_4edge()],
// 1 16 0 40 0 2 0 0 0 -1 0 0 0 2 4-4ring3.dat
  [1,16,0,40,0,2,0,0,0,-1,0,0,0,2, ldraw_lib__4_4ring3()],
// 1 16 0 40 0 2 0 0 0 -1 0 0 0 2 4-4ring4.dat
  [1,16,0,40,0,2,0,0,0,-1,0,0,0,2, ldraw_lib__4_4ring4()],
// 1 16 0 4 0 2 0 0 0 -1 0 0 0 2 4-4ring2.dat
  [1,16,0,4,0,2,0,0,0,-1,0,0,0,2, ldraw_lib__4_4ring2()],
// 1 16 0 0 0 2 0 0 0 1 0 0 0 2 4-4ring3.dat
  [1,16,0,0,0,2,0,0,0,1,0,0,0,2, ldraw_lib__4_4ring3()],
// 1 16 0 0 0 2 0 0 0 1 0 0 0 2 4-4ring4.dat
  [1,16,0,0,0,2,0,0,0,1,0,0,0,2, ldraw_lib__4_4ring4()],
// 0 BFC INVERTNEXT
  [0,"BFC","INVERTNEXT"],
// 1 16 0 0 0 4 0 0 0 4 0 0 0 4 4-4cyli.dat
  [1,16,0,0,0,4,0,0,0,4,0,0,0,4, ldraw_lib__4_4cyli()],
// 0 BFC INVERTNEXT
  [0,"BFC","INVERTNEXT"],
// 1 16 0 4 0 6 0 0 0 36 0 0 0 6 4-4cyli.dat
  [1,16,0,4,0,6,0,0,0,36,0,0,0,6, ldraw_lib__4_4cyli()],
// 1 16 0 0 0 10 0 0 0 40 0 0 0 10 4-4cyli.dat
  [1,16,0,0,0,10,0,0,0,40,0,0,0,10, ldraw_lib__4_4cyli()],
// 1 16 0 0 0 1 0 0 0 1 0 0 0 1 stud2a.dat
  [1,16,0,0,0,1,0,0,0,1,0,0,0,1, ldraw_lib__stud2a()],
// 0
];
module ldraw_lib__71075a(step=0, col=false, unit=2/5, alt=false, line=0.2, solid=!$preview)
    makepoly(ldraw_lib__71075a(), step=step, col=col, unit=unit, alt=alt, line=line, solid=solid);
ldraw_lib__71075a(line=0.2);
// main file
use <../lib.scad>
use <71075a.scad>
function ldraw_lib__71076() = [
// 0 ~Moved to 71075a
// 0 Name: 71076.dat
// 0 Author: [PTadmin]
// 0 !LDRAW_ORG Part UPDATE 2010-03
// 0 !LICENSE Licensed under CC BY 4.0 : see CAreadme.txt
// 
// 0 BFC CERTIFY CCW
  [0,"BFC","CERTIFY"],
  [0,"BFC","CCW"],
// 
// 0 !HISTORY 2010-12-31 [PTadmin] Official Update 2010-03
// 
// 
// 0 // Exhaust Pipe Straight
// 1 16 0 0 0 1 0 0 0 1 0 0 0 1 71075a.dat
  [1,16,0,0,0,1,0,0,0,1,0,0,0,1, ldraw_lib__71075a()],
];
module ldraw_lib__71076(step=0, col=false, unit=2/5, alt=false, line=0.2, solid=!$preview)
    makepoly(ldraw_lib__71076(), step=step, col=col, unit=unit, alt=alt, line=line, solid=solid);
ldraw_lib__71076(line=0.2);
